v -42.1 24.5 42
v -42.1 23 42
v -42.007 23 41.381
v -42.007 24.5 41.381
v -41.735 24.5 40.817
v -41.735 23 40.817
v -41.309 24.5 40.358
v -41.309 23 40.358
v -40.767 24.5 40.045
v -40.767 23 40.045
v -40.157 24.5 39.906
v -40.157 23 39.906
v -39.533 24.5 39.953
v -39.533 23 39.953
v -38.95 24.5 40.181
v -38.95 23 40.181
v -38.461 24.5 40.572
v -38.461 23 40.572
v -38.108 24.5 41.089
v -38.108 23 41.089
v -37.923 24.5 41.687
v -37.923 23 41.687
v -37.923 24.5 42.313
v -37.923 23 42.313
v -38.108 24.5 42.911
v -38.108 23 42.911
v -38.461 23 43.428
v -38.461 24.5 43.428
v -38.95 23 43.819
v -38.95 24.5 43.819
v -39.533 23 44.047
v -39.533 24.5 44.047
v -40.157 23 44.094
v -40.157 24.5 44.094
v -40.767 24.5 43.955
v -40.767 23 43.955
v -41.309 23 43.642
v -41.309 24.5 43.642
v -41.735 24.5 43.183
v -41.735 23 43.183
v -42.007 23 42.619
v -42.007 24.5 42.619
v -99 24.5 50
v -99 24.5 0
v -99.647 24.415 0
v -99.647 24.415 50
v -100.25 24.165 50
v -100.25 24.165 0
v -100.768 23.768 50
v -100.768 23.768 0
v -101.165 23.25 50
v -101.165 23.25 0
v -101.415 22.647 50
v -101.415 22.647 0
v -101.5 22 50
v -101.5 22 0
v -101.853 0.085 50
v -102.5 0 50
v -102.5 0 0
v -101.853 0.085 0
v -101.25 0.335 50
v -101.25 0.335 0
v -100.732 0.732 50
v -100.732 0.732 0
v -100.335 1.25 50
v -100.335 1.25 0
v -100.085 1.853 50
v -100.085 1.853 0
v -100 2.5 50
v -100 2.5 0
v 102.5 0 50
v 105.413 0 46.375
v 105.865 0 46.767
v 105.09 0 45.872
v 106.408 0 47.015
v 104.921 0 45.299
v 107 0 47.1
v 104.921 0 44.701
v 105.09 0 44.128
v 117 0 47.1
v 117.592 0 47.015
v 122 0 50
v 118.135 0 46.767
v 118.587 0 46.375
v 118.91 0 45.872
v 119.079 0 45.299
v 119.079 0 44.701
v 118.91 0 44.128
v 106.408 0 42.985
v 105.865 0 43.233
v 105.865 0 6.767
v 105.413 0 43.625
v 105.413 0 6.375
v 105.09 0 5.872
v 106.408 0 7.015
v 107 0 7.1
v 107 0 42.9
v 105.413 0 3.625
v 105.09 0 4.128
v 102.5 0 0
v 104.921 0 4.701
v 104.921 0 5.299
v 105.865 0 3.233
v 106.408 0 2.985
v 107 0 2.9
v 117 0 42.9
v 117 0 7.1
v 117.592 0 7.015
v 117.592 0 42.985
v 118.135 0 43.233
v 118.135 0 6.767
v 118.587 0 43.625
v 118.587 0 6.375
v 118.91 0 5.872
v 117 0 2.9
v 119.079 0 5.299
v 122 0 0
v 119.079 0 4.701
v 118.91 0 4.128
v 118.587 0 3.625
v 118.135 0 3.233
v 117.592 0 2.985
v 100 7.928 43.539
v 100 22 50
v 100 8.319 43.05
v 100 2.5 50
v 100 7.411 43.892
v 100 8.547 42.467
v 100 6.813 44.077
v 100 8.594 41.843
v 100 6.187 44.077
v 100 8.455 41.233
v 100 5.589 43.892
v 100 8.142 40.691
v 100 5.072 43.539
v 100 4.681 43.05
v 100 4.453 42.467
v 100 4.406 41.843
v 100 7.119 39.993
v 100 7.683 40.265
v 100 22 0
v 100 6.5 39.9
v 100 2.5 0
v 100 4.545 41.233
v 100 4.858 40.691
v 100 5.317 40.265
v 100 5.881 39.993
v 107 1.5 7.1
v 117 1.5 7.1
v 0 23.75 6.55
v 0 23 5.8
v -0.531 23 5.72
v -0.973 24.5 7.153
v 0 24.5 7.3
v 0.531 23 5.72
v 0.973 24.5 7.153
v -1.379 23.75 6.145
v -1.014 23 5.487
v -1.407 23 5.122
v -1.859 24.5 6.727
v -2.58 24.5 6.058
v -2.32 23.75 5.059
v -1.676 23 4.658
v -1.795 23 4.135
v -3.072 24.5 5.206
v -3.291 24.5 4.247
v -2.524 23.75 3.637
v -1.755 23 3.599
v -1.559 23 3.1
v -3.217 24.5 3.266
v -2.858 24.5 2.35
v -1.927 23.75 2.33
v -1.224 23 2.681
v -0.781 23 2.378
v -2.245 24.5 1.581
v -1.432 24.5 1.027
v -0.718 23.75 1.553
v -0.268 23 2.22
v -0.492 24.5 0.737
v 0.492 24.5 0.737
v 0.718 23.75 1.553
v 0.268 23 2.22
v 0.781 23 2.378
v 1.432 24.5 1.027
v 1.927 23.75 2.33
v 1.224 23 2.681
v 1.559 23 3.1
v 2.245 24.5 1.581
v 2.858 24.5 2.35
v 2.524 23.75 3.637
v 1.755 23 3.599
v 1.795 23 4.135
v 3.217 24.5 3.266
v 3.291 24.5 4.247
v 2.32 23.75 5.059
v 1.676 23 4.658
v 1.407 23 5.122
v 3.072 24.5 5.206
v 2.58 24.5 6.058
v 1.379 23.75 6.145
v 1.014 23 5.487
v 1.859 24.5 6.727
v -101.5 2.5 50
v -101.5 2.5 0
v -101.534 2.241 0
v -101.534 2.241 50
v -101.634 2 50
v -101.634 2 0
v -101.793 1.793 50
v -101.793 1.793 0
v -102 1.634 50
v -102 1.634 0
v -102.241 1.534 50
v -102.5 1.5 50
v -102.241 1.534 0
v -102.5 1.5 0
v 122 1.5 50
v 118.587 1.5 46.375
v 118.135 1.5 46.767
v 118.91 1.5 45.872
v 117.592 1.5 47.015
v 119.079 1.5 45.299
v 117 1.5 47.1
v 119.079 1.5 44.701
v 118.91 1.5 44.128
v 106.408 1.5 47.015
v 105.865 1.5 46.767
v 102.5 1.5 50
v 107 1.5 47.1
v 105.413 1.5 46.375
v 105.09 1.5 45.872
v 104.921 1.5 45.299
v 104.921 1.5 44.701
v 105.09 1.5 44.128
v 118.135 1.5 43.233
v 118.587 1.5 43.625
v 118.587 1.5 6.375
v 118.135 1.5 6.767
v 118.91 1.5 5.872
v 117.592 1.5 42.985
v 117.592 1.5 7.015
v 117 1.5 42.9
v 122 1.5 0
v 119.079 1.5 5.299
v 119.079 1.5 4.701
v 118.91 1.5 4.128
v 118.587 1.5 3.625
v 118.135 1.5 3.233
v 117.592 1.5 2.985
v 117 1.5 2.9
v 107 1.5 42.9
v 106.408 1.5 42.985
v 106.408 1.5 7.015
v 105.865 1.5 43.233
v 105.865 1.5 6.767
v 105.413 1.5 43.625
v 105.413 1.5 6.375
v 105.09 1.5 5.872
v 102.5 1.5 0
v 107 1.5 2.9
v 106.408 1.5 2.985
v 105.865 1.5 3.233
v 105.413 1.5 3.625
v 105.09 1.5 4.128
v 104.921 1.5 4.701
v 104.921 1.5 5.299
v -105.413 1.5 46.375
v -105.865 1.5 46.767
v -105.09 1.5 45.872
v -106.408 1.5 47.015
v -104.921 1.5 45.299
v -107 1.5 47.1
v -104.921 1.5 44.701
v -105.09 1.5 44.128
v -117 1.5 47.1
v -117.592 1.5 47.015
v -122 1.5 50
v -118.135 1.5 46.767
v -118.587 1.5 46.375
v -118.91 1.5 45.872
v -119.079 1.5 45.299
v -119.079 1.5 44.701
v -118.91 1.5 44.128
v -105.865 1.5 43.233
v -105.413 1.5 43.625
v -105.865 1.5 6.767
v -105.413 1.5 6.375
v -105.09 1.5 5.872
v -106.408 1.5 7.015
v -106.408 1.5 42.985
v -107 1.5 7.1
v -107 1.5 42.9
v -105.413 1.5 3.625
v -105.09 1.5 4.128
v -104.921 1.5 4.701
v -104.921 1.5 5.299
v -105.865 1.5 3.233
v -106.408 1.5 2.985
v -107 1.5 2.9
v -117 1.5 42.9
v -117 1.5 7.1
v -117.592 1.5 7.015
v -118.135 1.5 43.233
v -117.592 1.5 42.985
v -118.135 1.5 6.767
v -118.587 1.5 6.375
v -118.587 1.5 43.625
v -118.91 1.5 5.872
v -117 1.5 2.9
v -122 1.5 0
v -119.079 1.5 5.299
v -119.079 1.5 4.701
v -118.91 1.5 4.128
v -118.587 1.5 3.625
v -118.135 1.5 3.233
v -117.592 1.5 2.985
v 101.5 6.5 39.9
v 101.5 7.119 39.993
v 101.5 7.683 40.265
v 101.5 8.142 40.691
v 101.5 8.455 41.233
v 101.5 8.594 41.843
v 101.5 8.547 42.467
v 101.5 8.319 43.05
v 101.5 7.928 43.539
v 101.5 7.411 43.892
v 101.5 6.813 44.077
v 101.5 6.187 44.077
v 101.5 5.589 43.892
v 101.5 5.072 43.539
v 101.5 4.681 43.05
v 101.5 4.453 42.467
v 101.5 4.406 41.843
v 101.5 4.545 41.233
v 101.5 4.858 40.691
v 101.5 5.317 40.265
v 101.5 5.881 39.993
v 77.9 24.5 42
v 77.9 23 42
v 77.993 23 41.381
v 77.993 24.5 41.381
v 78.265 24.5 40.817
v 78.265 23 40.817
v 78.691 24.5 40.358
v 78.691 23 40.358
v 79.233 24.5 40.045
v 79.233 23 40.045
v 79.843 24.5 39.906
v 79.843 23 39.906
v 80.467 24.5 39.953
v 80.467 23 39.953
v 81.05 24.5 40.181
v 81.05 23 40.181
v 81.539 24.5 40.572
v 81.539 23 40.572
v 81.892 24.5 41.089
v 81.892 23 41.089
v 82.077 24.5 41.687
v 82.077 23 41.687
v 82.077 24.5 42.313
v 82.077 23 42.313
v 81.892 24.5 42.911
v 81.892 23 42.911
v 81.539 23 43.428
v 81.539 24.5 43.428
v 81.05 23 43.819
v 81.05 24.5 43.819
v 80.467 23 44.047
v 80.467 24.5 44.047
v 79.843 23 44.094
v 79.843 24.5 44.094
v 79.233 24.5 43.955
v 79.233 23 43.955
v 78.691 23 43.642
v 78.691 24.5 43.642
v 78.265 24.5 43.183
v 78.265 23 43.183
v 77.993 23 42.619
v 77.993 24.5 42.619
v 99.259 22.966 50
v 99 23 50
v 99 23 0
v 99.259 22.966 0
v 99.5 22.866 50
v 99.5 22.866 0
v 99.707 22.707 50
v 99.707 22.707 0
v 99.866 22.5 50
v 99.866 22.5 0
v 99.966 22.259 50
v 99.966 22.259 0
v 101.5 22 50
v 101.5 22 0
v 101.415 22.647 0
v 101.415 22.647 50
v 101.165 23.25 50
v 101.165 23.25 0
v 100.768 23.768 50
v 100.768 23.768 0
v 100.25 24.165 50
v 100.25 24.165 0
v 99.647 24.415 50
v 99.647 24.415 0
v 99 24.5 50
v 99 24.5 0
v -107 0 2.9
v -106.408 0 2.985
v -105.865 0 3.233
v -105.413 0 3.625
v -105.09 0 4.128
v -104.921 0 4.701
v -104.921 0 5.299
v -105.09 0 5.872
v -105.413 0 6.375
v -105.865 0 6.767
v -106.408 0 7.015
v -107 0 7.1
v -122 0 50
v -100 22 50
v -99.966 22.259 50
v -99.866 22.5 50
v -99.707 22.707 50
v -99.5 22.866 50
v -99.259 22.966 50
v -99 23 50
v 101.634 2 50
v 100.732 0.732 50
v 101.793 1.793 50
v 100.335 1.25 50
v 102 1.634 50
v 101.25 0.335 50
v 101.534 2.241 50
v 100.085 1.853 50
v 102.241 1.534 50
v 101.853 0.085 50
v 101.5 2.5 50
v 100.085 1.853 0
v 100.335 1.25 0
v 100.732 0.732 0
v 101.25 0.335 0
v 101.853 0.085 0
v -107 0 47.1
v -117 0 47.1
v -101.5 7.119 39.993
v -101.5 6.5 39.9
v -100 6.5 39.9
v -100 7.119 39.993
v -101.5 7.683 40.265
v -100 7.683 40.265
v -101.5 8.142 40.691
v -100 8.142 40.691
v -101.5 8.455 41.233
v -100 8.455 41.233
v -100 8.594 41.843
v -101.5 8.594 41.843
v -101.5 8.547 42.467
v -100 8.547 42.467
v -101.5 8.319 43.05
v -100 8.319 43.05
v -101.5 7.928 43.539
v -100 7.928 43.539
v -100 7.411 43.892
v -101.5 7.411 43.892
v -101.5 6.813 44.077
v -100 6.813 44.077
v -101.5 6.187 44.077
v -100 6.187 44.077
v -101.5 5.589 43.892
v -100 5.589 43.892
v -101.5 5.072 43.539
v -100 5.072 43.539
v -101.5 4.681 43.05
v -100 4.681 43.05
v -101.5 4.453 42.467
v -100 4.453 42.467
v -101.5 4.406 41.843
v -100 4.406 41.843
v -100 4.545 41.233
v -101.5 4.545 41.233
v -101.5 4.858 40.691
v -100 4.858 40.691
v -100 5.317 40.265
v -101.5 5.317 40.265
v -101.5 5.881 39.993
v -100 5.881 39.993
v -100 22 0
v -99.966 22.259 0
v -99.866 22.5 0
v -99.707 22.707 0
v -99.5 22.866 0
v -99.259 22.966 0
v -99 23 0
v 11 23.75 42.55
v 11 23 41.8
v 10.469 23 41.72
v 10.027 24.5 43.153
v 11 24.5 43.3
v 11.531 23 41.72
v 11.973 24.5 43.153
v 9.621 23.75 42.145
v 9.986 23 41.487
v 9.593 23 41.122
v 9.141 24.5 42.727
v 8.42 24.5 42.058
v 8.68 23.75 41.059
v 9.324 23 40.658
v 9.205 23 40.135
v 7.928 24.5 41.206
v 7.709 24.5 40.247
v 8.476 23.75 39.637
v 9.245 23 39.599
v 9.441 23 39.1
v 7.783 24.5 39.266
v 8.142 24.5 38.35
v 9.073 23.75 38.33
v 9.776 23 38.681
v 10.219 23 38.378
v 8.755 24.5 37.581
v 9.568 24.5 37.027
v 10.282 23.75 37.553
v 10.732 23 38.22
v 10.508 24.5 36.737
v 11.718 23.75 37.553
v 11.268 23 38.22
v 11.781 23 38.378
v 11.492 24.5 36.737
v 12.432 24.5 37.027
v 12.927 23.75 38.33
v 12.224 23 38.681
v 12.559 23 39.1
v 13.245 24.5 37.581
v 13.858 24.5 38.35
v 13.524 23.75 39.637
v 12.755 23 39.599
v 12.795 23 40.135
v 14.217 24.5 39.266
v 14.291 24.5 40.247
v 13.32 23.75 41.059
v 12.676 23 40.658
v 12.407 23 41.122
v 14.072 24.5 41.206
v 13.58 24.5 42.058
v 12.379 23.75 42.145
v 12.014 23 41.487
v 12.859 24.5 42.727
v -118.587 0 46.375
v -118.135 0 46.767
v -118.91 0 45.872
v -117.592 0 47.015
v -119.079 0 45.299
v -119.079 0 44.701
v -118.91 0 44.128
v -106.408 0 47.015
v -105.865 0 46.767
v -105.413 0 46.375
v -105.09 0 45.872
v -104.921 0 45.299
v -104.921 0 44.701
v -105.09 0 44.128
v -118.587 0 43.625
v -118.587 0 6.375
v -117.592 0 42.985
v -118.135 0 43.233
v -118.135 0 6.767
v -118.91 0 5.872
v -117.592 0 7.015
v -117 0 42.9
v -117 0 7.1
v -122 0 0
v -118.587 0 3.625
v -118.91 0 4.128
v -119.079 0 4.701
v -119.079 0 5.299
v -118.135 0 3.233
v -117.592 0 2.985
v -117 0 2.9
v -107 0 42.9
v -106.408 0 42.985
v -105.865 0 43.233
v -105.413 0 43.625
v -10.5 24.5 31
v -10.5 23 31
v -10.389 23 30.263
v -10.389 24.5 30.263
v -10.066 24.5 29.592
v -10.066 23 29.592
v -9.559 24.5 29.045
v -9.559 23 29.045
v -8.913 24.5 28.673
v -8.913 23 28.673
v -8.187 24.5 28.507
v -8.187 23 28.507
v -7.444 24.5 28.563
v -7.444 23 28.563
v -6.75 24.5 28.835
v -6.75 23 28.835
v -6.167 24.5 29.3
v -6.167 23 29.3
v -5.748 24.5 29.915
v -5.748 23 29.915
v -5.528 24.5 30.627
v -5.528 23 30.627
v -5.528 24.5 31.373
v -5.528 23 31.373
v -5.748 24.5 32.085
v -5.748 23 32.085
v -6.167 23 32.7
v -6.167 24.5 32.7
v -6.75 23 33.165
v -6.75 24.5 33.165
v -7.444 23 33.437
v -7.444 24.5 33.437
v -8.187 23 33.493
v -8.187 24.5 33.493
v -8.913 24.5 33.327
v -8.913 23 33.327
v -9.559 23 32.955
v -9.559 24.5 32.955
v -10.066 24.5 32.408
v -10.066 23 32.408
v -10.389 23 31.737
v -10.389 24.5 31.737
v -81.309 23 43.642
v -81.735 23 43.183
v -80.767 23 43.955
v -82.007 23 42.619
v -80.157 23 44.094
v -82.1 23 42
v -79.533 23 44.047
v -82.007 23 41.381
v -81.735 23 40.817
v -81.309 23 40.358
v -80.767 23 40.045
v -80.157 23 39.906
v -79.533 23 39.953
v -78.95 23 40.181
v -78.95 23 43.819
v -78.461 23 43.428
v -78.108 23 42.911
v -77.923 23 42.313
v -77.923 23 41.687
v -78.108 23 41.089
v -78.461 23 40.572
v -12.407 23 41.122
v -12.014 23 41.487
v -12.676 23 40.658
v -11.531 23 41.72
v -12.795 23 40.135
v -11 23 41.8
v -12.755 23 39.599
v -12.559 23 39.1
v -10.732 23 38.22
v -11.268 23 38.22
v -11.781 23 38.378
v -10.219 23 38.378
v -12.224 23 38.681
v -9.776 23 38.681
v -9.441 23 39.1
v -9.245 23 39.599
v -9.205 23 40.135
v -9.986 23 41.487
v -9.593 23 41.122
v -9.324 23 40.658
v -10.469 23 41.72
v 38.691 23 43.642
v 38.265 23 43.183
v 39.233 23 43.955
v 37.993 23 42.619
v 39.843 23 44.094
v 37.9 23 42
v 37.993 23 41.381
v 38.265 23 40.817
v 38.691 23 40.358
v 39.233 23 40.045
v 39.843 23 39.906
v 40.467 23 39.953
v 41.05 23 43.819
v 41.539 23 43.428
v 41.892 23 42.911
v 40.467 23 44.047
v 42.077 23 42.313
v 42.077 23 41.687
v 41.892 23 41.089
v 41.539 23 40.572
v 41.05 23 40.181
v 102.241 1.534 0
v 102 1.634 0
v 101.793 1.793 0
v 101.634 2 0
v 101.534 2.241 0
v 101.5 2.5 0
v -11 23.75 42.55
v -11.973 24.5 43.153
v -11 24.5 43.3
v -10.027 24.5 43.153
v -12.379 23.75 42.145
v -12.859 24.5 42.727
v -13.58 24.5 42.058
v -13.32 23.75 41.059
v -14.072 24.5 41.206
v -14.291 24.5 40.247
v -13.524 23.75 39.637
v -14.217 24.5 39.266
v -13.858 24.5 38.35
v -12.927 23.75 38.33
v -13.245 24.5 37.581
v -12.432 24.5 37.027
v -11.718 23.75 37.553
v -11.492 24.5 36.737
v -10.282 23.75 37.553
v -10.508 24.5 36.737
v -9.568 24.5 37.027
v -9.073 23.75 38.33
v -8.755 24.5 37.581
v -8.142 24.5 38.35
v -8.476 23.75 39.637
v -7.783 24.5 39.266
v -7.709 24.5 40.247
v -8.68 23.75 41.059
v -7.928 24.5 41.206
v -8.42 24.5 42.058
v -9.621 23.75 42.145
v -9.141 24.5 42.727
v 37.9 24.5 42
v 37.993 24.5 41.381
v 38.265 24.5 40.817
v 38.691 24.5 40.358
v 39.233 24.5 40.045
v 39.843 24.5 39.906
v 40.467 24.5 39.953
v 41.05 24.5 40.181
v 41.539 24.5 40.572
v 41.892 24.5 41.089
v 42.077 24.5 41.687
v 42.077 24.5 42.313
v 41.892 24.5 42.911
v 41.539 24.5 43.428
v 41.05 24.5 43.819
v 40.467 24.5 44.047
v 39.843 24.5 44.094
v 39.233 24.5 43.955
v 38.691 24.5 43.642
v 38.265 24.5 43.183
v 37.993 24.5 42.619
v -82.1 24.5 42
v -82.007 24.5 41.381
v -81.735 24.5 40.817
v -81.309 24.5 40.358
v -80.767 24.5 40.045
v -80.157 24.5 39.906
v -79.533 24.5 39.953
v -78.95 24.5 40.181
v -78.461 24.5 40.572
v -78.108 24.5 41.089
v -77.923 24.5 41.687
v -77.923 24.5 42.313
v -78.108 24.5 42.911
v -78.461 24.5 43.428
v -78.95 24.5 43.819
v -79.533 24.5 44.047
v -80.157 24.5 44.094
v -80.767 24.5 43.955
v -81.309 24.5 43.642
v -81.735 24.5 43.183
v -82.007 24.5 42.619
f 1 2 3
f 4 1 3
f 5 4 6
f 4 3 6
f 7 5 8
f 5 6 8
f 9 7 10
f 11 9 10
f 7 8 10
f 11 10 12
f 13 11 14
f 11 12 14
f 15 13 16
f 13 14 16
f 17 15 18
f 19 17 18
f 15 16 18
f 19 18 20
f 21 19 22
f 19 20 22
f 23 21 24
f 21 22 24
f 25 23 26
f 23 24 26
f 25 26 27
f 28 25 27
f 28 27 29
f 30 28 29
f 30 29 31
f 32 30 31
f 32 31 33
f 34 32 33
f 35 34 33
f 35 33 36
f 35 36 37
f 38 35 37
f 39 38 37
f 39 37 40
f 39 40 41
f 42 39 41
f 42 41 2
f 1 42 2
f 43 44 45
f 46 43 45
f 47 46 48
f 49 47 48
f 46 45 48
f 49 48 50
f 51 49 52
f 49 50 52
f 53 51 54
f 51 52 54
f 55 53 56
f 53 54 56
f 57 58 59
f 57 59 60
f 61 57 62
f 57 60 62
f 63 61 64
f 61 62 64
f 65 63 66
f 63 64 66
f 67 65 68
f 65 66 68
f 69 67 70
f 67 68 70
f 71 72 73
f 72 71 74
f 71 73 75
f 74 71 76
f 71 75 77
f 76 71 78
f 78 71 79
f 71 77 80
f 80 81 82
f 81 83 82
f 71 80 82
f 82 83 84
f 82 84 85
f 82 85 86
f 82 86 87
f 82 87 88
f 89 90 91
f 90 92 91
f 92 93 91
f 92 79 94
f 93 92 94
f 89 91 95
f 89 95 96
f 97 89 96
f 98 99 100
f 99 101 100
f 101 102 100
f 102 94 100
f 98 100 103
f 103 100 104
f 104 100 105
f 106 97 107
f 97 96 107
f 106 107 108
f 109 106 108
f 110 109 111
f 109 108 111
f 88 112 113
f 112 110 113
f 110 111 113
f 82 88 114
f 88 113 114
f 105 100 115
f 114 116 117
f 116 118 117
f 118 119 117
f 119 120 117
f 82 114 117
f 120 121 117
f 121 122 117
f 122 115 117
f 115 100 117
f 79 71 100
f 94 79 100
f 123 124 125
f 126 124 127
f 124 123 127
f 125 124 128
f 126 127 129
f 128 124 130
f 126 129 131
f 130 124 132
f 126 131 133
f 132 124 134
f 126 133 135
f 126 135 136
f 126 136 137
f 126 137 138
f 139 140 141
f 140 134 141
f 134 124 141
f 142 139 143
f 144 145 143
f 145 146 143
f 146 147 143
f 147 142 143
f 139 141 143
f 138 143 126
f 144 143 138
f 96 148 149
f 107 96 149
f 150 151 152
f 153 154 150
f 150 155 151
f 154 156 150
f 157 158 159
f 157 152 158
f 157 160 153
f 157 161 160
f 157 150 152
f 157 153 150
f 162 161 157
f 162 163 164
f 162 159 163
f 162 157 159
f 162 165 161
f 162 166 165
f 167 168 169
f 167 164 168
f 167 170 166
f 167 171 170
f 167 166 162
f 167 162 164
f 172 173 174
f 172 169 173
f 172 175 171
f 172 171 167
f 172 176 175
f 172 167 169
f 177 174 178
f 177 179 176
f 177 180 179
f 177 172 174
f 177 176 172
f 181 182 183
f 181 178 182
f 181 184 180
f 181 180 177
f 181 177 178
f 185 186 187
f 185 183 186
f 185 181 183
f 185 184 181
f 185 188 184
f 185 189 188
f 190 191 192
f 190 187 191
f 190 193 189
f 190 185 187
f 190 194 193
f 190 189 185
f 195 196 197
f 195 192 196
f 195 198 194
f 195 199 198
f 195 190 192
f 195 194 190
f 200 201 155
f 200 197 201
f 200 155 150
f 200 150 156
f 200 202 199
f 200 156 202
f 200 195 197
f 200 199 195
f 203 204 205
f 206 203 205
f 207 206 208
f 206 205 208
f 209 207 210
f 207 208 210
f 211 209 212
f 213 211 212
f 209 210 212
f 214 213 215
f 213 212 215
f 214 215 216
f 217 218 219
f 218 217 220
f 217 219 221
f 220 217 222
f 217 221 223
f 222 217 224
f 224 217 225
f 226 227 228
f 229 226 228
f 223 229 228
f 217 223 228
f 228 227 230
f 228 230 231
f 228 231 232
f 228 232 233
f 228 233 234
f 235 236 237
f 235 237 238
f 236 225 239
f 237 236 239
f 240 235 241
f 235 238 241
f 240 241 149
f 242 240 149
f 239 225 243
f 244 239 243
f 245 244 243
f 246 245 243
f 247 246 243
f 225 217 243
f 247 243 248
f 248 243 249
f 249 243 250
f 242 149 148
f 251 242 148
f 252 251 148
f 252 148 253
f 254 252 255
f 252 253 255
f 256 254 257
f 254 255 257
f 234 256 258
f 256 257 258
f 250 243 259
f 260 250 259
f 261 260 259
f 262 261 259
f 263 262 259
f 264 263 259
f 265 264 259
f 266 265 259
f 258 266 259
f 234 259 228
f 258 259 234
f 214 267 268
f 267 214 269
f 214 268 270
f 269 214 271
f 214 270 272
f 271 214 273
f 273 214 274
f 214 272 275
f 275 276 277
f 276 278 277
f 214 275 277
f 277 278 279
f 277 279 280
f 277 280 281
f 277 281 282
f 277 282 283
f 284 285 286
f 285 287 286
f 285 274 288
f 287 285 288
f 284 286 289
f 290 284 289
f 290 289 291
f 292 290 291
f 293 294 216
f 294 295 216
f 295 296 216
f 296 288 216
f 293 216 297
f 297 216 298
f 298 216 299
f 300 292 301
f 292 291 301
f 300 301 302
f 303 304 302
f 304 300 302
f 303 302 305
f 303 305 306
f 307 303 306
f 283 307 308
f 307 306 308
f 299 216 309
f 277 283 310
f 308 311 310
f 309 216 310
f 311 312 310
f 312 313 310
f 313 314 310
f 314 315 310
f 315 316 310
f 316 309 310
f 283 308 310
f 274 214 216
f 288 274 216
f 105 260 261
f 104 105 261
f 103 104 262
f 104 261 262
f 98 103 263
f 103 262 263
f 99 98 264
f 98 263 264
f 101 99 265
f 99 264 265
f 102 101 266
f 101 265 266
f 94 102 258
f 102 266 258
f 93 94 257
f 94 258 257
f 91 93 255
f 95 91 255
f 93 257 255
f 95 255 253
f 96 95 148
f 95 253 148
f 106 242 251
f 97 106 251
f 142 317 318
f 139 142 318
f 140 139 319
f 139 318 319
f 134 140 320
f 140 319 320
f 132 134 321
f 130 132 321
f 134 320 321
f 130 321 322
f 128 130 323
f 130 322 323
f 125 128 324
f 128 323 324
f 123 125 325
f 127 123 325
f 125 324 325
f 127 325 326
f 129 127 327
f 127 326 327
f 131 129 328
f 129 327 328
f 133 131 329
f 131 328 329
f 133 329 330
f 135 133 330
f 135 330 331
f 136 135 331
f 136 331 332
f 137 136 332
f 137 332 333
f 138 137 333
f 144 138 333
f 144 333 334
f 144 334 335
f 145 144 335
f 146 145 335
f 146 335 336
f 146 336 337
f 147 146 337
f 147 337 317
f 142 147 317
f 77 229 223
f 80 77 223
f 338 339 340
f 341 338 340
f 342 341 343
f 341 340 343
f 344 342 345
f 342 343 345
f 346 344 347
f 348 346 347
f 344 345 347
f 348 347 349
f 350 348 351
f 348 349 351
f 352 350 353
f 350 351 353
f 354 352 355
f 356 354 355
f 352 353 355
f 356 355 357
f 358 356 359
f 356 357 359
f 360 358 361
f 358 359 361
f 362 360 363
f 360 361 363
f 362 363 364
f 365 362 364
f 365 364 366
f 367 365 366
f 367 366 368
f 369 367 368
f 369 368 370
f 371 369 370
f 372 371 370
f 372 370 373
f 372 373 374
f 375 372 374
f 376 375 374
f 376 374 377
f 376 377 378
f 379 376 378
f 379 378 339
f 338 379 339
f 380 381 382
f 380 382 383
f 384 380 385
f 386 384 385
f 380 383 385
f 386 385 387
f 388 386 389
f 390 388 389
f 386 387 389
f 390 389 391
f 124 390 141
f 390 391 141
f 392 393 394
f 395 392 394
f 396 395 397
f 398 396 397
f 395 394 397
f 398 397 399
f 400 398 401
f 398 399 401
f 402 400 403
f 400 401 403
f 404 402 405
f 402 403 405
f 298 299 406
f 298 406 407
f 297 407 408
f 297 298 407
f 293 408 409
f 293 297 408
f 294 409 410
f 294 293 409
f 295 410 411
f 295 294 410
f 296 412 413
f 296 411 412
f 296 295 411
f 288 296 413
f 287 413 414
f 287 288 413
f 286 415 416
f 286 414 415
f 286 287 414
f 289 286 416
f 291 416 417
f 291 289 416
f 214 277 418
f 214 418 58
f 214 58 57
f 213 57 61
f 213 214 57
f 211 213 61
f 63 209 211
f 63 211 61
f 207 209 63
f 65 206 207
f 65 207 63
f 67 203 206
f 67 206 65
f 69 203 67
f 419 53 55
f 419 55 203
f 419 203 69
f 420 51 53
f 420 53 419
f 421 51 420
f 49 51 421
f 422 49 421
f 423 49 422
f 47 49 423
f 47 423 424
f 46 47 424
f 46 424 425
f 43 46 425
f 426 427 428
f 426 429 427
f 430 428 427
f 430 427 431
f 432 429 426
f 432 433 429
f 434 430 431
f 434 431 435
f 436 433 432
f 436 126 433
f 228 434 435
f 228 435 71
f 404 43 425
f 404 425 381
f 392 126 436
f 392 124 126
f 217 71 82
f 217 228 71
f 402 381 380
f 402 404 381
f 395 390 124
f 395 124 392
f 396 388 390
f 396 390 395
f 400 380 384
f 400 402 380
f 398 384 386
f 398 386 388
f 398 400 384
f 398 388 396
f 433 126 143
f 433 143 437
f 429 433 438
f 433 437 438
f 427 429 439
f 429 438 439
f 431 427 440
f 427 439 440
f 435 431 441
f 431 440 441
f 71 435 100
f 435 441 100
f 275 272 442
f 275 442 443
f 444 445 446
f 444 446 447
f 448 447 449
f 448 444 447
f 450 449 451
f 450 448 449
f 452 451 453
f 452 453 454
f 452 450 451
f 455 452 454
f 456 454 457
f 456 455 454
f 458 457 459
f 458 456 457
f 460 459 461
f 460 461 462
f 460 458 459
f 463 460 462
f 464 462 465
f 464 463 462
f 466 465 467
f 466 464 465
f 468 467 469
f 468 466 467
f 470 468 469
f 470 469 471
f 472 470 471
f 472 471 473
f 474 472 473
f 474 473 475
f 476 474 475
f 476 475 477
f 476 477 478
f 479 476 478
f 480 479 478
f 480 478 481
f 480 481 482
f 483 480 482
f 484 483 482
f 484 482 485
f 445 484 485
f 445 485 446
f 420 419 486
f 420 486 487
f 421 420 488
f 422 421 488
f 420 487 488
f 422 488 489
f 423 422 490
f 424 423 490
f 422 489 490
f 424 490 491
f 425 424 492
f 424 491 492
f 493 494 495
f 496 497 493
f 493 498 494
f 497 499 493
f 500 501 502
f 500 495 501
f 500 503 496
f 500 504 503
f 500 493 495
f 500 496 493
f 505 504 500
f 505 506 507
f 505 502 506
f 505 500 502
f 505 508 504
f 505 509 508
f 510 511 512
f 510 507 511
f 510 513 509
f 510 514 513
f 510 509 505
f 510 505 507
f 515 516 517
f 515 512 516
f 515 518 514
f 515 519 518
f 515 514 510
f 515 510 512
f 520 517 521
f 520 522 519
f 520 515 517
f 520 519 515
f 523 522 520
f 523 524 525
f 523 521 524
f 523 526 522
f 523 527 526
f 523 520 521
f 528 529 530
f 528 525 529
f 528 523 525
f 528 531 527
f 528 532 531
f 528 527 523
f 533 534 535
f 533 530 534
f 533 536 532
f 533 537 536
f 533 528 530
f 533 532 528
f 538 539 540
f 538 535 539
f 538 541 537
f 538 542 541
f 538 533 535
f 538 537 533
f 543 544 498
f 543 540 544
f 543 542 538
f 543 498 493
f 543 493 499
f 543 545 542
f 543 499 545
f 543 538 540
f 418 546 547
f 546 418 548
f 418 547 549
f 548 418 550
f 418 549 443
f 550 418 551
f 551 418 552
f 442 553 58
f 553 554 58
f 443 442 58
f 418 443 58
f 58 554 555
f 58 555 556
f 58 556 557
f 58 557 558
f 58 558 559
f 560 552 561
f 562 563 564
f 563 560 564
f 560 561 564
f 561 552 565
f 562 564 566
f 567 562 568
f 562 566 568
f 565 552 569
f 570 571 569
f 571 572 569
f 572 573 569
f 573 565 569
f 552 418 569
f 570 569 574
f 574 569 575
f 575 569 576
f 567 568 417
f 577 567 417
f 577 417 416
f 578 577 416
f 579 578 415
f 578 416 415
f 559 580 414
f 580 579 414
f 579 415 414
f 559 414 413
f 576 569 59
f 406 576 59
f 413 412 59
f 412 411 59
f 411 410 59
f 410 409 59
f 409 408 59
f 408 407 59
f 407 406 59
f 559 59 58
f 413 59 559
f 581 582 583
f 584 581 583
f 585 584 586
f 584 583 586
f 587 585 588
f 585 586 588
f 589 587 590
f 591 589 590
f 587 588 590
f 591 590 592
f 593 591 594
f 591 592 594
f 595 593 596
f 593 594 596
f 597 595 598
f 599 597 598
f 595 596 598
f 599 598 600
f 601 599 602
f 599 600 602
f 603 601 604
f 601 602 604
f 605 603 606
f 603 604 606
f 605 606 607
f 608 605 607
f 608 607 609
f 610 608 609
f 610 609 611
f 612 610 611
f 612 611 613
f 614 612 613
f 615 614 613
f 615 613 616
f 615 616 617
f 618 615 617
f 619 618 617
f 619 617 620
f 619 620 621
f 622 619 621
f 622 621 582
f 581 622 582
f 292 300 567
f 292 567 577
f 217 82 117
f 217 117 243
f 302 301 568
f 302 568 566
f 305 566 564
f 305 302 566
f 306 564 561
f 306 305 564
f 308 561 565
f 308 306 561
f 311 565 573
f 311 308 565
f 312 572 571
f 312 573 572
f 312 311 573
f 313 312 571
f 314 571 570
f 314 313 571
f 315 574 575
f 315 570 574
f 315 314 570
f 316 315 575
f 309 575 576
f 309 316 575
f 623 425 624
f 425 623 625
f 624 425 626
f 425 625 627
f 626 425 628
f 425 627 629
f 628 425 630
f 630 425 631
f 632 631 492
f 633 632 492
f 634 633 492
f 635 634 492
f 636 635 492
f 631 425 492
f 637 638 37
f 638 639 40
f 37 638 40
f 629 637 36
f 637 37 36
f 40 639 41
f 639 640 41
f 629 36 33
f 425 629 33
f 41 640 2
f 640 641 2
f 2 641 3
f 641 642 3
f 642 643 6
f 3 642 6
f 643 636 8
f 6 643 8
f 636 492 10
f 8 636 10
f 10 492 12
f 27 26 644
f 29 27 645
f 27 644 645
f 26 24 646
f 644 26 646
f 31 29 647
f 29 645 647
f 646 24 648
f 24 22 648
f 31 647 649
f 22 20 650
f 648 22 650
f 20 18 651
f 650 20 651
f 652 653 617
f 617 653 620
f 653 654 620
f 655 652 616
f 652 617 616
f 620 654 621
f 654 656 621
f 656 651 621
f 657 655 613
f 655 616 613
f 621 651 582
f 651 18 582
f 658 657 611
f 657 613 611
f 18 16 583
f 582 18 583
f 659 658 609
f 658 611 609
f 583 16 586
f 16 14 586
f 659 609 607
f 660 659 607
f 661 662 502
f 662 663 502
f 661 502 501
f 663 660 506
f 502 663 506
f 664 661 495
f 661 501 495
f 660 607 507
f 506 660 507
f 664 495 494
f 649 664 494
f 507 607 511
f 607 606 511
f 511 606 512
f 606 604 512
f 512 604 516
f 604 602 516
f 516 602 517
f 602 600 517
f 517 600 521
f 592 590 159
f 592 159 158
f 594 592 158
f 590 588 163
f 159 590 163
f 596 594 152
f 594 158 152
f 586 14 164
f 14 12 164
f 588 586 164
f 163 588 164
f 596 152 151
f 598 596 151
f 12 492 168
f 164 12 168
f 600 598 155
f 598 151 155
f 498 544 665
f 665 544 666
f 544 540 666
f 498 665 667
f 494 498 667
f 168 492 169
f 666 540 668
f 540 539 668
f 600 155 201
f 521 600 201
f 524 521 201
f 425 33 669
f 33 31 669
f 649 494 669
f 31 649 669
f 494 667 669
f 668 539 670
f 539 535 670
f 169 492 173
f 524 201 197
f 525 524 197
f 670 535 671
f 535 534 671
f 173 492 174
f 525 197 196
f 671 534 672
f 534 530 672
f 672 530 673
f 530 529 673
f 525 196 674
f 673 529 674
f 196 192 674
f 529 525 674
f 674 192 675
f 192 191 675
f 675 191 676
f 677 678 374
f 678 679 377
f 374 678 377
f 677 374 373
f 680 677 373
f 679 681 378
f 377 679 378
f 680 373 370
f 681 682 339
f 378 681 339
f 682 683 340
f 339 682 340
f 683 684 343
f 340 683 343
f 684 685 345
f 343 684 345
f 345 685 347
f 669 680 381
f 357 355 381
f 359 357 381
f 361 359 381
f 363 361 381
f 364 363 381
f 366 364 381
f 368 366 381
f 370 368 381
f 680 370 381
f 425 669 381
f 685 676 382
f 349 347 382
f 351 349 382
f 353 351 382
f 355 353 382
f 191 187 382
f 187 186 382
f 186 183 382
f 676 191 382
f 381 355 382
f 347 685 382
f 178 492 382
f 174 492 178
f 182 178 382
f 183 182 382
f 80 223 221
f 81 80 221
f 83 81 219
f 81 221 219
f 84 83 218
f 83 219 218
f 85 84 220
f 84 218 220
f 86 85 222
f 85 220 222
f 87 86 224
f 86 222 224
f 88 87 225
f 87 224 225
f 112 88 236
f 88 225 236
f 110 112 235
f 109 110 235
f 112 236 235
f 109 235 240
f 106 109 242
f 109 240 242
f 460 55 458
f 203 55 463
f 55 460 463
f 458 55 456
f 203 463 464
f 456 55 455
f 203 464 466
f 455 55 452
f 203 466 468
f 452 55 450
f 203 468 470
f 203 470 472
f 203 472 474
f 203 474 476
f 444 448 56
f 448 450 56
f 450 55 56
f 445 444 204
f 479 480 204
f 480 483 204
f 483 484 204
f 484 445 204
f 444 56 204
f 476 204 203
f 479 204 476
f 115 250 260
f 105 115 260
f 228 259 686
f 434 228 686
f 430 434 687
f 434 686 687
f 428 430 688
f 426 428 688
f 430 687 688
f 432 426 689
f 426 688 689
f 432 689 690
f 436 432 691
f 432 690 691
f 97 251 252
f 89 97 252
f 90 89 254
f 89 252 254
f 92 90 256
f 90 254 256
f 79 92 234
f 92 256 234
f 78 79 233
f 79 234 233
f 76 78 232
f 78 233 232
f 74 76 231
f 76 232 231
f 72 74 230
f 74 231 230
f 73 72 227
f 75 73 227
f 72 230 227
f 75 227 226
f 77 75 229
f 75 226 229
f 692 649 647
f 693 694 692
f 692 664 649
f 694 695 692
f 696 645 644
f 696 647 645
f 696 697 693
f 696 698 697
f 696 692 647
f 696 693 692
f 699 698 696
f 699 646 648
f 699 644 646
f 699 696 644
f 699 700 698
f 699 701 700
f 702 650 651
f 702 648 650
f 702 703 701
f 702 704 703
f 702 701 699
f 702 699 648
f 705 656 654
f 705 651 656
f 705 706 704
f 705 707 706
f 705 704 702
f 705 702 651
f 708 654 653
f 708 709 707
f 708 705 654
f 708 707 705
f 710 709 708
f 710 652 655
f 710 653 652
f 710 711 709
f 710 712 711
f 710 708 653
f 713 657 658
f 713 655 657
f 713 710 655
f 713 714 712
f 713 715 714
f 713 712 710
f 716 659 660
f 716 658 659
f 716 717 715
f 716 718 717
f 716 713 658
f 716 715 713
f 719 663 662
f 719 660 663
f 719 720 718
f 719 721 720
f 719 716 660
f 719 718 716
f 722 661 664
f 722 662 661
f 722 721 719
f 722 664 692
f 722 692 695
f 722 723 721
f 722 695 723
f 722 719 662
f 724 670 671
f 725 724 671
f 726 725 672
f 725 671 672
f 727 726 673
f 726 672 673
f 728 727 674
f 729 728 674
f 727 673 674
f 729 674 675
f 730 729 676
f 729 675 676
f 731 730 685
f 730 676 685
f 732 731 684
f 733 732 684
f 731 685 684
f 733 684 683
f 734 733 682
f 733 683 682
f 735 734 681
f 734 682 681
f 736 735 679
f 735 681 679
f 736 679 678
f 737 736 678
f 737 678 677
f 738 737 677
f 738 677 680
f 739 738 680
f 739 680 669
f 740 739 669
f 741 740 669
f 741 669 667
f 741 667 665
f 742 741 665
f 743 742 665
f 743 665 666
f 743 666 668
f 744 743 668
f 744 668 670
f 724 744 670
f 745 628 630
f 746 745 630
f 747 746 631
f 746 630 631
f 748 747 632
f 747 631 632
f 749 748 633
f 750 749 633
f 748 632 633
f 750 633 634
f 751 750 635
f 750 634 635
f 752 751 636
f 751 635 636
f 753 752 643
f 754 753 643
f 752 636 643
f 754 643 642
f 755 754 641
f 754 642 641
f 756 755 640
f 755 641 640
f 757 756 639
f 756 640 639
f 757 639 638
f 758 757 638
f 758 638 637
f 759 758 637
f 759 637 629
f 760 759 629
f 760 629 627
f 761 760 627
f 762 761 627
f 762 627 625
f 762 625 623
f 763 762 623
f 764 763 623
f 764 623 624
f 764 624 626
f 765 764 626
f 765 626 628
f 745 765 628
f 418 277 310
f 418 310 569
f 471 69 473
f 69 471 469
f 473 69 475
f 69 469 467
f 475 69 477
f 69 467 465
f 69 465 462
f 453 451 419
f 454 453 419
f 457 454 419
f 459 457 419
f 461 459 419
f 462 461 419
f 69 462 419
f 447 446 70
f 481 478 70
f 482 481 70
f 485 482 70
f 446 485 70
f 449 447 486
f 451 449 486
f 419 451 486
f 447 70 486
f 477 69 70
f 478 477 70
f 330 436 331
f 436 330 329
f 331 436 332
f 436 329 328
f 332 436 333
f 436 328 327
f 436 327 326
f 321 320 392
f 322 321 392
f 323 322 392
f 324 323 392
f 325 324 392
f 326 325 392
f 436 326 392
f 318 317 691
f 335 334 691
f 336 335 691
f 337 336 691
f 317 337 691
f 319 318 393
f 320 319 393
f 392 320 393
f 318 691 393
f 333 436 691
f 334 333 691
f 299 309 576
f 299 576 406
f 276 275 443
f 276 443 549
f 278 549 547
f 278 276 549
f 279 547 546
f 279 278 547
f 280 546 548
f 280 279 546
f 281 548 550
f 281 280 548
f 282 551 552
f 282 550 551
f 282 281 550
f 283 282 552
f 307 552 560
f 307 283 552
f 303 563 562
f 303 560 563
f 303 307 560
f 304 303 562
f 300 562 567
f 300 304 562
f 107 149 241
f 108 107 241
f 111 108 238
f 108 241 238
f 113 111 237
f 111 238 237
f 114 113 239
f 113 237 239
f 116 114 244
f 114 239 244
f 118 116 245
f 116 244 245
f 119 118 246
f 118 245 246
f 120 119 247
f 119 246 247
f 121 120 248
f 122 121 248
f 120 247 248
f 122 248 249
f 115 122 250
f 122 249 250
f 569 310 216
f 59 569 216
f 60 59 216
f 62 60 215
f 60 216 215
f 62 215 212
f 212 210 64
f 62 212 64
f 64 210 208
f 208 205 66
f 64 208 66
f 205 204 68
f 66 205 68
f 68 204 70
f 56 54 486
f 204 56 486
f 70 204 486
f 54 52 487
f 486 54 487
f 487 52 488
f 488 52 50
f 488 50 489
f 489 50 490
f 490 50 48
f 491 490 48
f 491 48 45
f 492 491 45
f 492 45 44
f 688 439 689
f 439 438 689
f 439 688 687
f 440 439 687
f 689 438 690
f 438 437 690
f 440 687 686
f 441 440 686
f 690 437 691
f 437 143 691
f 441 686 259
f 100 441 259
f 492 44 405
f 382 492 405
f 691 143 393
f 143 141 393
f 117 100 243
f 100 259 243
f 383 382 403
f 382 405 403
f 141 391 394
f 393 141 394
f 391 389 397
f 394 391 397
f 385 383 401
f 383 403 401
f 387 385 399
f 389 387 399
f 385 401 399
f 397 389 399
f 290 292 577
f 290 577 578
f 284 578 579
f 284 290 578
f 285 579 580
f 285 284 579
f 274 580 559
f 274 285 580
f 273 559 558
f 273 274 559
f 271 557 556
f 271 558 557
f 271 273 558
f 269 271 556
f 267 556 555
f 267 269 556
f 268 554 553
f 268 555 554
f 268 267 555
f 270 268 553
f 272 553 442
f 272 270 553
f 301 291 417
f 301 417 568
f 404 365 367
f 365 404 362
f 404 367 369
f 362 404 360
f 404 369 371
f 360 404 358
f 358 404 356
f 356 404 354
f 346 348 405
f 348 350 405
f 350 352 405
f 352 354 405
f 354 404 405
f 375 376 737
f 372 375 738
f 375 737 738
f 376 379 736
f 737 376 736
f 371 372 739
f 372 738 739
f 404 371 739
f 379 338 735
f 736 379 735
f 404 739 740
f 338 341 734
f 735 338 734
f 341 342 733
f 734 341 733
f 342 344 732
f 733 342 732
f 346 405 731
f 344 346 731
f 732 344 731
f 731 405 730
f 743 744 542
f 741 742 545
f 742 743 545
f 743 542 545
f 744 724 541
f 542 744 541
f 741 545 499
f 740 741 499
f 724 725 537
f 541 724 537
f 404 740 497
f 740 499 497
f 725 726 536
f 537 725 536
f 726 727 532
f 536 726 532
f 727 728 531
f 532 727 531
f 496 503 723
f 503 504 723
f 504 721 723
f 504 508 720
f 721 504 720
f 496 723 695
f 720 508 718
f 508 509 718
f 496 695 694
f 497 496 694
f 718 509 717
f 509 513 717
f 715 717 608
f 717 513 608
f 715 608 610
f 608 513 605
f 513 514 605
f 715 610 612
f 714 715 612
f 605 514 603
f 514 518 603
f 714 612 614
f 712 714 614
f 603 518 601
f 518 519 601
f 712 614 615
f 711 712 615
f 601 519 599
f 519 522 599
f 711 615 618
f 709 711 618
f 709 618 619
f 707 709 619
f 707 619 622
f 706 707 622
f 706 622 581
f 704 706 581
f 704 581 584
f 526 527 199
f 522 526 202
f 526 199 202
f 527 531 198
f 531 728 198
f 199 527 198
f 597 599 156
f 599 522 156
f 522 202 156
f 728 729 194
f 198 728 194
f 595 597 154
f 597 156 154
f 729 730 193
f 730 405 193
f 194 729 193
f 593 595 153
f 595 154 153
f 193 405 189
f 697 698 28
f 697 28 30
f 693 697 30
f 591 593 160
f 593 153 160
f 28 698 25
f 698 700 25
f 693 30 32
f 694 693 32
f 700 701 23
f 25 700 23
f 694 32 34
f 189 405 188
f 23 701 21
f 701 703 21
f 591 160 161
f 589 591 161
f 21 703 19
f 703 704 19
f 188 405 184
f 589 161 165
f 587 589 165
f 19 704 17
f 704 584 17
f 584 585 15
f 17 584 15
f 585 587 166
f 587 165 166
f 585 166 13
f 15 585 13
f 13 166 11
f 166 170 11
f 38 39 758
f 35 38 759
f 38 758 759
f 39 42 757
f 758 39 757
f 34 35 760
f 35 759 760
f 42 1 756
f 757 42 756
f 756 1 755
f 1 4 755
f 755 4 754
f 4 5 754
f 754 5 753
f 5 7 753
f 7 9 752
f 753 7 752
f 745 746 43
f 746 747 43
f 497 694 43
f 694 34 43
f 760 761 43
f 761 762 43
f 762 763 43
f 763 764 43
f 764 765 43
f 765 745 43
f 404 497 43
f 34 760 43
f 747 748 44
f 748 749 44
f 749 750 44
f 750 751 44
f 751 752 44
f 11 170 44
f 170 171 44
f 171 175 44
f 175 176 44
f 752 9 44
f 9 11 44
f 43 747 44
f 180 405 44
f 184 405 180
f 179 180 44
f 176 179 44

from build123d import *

# Parameters (mm, degrees)
SM_BASE_FLANGE_1_DEPTH       = 50
HOLE_WIZARD_1_AT_2_COUNT     = 2
HOLE_WIZARD_1_AT_2_PITCH     = 37.643060449
HOLE_WIZARD_1_AT_3_COUNT     = 2
HOLE_WIZARD_1_AT_3_PITCH     = 37.643060449
HOLE_WIZARD_4_2_4_2_1_D      = 4.2
HOLE_WIZARD_4_2_4_2_2_REACH  = 232.331
HOLE_WIZARD_4_2_4_2_2_BORE_R = 2.1
CUT_EXTRUDE_1_DEPTH          = 134.839456066
HOLE_WIZARD_5_0_5_1_D        = 5


# Read off the part's stored shape, not the designer's step: 基体-法兰1
with BuildPart() as part:
    # 基体-法兰1 outline → 基体-法兰1 (new body)
    with BuildSketch(Plane.XY):
        with BuildLine():
            Line((102.5, 0), (122, 0))
            Line((122, 0), (122, 1.5))
            Line((122, 1.5), (102.5, 1.5))
            ThreePointArc((102.5, 1.5), (101.792893219, 1.792893219), (101.5, 2.5))
            Line((101.5, 2.5), (101.5, 22))
            ThreePointArc((101.5, 22), (100.767766953, 23.767766953), (99, 24.5))
            Line((99, 24.5), (-99, 24.5))
            ThreePointArc((-99, 24.5), (-100.767766953, 23.767766953), (-101.5, 22))
            Line((-101.5, 22), (-101.5, 2.5))
            ThreePointArc((-101.5, 2.5), (-101.792893219, 1.792893219), (-102.5, 1.5))
            Line((-102.5, 1.5), (-122, 1.5))
            Line((-122, 1.5), (-122, 0))
            Line((-122, 0), (-102.5, 0))
            ThreePointArc((-102.5, 0), (-100.732233047, 0.732233047), (-100, 2.5))
            Line((-100, 2.5), (-100, 22))
            ThreePointArc((-100, 22), (-99.707106781, 22.707106781), (-99, 23))
            Line((-99, 23), (99, 23))
            ThreePointArc((99, 23), (99.707106781, 22.707106781), (100, 22))
            Line((100, 22), (100, 2.5))
            ThreePointArc((100, 2.5), (100.732233047, 0.732233047), (102.5, 0))
        make_face()
    extrude(amount=SM_BASE_FLANGE_1_DEPTH)

    # 草图9 → 打孔尺寸(%根据)开槽沉头木螺钉的类型1 (revolve, cut)
    with BuildSketch(Plane(origin=(0, 24.5, 4), x_dir=(0, 0, 1), z_dir=(1, 0, 0))):
        Polygon((0, 0), (0, 1.5), (1.7, 1.5), (1.7, 1.6), (3.3, 0), align=None)
    hole_wizard_1 = revolve(axis=Axis((0, 30.85, 4), (0, -1, 0)), mode=Mode.SUBTRACT)

    # 打孔尺寸(%根据)开槽沉头木螺钉的类型1 at 2: 打孔尺寸(%根据)开槽沉头木螺钉的类型1 ×2
    with Locations(*[Vector(-0.29221853559902017, 0, 0.956351571051339) * (i * HOLE_WIZARD_1_AT_2_PITCH) for i in range(1, HOLE_WIZARD_1_AT_2_COUNT)]):
        add(hole_wizard_1, mode=Mode.SUBTRACT)

    # 打孔尺寸(%根据)开槽沉头木螺钉的类型1 at 3: 打孔尺寸(%根据)开槽沉头木螺钉的类型1 ×2
    with Locations(*[Vector(0.2922185355990204, 0, 0.956351571051339) * (i * HOLE_WIZARD_1_AT_3_PITCH) for i in range(1, HOLE_WIZARD_1_AT_3_COUNT)]):
        add(hole_wizard_1, mode=Mode.SUBTRACT)

    # Ø4.2 (4.2) 直径孔1 (through all)
    with Locations(Plane(origin=(0, 24.5, 0), x_dir=(1, 0, 0), z_dir=(0, 1, 0))):
        with Locations((-40, -42), (-80, -42), (40, -42), (80, -42)):
            Hole(HOLE_WIZARD_4_2_4_2_1_D / 2)

    # Ø4.2 (4.2) 直径孔2 bore → Ø4.2 (4.2) 直径孔2 (cut, up to next)
    with BuildSketch(Plane(origin=(101.5, 0, 0), x_dir=(0, 0, -1), z_dir=(1, 0, 0)), mode=Mode.PRIVATE) as hole_wizard_4_2_4_2_2_sk1:
        with Locations((-42, 6.5)):
            Circle(HOLE_WIZARD_4_2_4_2_2_BORE_R)
    hole_wizard_4_2_4_2_2_tool1 = extrude(hole_wizard_4_2_4_2_2_sk1.sketch, amount=-HOLE_WIZARD_4_2_4_2_2_REACH, mode=Mode.PRIVATE) & part.part
    hole_wizard_4_2_4_2_2 = hole_wizard_4_2_4_2_2_tool1.solids().sort_by_distance((101.5, 6.5, 42))[0]
    add(hole_wizard_4_2_4_2_2, mode=Mode.SUBTRACT)

    # 镜向1: Ø4.2 (4.2) 直径孔2 across plane
    add(hole_wizard_4_2_4_2_2.mirror(Plane(origin=(0, 0, 0), x_dir=(0, 0, 1), z_dir=(1, 0, 0))), mode=Mode.SUBTRACT)

    # 草图15 → 切除-拉伸1 (cut, through all)
    with BuildSketch(Plane(origin=(0, 1.5, 0), x_dir=(1, 0, 0), z_dir=(0, 1, 0))):
        with BuildLine():
            Line((-117, -2.9), (-107, -2.9))
            ThreePointArc((-107, -2.9), (-104.9, -5), (-107, -7.1))
            Line((-107, -7.1), (-117, -7.1))
            ThreePointArc((-117, -7.1), (-119.1, -5), (-117, -2.9))
        make_face()
        with BuildLine():
            Line((-117, -42.9), (-107, -42.9))
            ThreePointArc((-107, -42.9), (-104.9, -45), (-107, -47.1))
            Line((-107, -47.1), (-117, -47.1))
            ThreePointArc((-117, -47.1), (-119.1, -45), (-117, -42.9))
        make_face()
    cut_extrude_1 = extrude(amount=-CUT_EXTRUDE_1_DEPTH, mode=Mode.SUBTRACT)

    # 镜向2: 切除-拉伸1 across plane
    add(cut_extrude_1.mirror(Plane(origin=(0, 0, 0), x_dir=(0, 0, 1), z_dir=(1, 0, 0))), mode=Mode.SUBTRACT)

    # Ø5.0 (5) 直径孔1 (through all)
    with Locations(Plane(origin=(0, 24.5, 0), x_dir=(1, 0, 0), z_dir=(0, 1, 0))):
        with Locations((-8, -31)):
            Hole(HOLE_WIZARD_5_0_5_1_D / 2)


solid = part.part
